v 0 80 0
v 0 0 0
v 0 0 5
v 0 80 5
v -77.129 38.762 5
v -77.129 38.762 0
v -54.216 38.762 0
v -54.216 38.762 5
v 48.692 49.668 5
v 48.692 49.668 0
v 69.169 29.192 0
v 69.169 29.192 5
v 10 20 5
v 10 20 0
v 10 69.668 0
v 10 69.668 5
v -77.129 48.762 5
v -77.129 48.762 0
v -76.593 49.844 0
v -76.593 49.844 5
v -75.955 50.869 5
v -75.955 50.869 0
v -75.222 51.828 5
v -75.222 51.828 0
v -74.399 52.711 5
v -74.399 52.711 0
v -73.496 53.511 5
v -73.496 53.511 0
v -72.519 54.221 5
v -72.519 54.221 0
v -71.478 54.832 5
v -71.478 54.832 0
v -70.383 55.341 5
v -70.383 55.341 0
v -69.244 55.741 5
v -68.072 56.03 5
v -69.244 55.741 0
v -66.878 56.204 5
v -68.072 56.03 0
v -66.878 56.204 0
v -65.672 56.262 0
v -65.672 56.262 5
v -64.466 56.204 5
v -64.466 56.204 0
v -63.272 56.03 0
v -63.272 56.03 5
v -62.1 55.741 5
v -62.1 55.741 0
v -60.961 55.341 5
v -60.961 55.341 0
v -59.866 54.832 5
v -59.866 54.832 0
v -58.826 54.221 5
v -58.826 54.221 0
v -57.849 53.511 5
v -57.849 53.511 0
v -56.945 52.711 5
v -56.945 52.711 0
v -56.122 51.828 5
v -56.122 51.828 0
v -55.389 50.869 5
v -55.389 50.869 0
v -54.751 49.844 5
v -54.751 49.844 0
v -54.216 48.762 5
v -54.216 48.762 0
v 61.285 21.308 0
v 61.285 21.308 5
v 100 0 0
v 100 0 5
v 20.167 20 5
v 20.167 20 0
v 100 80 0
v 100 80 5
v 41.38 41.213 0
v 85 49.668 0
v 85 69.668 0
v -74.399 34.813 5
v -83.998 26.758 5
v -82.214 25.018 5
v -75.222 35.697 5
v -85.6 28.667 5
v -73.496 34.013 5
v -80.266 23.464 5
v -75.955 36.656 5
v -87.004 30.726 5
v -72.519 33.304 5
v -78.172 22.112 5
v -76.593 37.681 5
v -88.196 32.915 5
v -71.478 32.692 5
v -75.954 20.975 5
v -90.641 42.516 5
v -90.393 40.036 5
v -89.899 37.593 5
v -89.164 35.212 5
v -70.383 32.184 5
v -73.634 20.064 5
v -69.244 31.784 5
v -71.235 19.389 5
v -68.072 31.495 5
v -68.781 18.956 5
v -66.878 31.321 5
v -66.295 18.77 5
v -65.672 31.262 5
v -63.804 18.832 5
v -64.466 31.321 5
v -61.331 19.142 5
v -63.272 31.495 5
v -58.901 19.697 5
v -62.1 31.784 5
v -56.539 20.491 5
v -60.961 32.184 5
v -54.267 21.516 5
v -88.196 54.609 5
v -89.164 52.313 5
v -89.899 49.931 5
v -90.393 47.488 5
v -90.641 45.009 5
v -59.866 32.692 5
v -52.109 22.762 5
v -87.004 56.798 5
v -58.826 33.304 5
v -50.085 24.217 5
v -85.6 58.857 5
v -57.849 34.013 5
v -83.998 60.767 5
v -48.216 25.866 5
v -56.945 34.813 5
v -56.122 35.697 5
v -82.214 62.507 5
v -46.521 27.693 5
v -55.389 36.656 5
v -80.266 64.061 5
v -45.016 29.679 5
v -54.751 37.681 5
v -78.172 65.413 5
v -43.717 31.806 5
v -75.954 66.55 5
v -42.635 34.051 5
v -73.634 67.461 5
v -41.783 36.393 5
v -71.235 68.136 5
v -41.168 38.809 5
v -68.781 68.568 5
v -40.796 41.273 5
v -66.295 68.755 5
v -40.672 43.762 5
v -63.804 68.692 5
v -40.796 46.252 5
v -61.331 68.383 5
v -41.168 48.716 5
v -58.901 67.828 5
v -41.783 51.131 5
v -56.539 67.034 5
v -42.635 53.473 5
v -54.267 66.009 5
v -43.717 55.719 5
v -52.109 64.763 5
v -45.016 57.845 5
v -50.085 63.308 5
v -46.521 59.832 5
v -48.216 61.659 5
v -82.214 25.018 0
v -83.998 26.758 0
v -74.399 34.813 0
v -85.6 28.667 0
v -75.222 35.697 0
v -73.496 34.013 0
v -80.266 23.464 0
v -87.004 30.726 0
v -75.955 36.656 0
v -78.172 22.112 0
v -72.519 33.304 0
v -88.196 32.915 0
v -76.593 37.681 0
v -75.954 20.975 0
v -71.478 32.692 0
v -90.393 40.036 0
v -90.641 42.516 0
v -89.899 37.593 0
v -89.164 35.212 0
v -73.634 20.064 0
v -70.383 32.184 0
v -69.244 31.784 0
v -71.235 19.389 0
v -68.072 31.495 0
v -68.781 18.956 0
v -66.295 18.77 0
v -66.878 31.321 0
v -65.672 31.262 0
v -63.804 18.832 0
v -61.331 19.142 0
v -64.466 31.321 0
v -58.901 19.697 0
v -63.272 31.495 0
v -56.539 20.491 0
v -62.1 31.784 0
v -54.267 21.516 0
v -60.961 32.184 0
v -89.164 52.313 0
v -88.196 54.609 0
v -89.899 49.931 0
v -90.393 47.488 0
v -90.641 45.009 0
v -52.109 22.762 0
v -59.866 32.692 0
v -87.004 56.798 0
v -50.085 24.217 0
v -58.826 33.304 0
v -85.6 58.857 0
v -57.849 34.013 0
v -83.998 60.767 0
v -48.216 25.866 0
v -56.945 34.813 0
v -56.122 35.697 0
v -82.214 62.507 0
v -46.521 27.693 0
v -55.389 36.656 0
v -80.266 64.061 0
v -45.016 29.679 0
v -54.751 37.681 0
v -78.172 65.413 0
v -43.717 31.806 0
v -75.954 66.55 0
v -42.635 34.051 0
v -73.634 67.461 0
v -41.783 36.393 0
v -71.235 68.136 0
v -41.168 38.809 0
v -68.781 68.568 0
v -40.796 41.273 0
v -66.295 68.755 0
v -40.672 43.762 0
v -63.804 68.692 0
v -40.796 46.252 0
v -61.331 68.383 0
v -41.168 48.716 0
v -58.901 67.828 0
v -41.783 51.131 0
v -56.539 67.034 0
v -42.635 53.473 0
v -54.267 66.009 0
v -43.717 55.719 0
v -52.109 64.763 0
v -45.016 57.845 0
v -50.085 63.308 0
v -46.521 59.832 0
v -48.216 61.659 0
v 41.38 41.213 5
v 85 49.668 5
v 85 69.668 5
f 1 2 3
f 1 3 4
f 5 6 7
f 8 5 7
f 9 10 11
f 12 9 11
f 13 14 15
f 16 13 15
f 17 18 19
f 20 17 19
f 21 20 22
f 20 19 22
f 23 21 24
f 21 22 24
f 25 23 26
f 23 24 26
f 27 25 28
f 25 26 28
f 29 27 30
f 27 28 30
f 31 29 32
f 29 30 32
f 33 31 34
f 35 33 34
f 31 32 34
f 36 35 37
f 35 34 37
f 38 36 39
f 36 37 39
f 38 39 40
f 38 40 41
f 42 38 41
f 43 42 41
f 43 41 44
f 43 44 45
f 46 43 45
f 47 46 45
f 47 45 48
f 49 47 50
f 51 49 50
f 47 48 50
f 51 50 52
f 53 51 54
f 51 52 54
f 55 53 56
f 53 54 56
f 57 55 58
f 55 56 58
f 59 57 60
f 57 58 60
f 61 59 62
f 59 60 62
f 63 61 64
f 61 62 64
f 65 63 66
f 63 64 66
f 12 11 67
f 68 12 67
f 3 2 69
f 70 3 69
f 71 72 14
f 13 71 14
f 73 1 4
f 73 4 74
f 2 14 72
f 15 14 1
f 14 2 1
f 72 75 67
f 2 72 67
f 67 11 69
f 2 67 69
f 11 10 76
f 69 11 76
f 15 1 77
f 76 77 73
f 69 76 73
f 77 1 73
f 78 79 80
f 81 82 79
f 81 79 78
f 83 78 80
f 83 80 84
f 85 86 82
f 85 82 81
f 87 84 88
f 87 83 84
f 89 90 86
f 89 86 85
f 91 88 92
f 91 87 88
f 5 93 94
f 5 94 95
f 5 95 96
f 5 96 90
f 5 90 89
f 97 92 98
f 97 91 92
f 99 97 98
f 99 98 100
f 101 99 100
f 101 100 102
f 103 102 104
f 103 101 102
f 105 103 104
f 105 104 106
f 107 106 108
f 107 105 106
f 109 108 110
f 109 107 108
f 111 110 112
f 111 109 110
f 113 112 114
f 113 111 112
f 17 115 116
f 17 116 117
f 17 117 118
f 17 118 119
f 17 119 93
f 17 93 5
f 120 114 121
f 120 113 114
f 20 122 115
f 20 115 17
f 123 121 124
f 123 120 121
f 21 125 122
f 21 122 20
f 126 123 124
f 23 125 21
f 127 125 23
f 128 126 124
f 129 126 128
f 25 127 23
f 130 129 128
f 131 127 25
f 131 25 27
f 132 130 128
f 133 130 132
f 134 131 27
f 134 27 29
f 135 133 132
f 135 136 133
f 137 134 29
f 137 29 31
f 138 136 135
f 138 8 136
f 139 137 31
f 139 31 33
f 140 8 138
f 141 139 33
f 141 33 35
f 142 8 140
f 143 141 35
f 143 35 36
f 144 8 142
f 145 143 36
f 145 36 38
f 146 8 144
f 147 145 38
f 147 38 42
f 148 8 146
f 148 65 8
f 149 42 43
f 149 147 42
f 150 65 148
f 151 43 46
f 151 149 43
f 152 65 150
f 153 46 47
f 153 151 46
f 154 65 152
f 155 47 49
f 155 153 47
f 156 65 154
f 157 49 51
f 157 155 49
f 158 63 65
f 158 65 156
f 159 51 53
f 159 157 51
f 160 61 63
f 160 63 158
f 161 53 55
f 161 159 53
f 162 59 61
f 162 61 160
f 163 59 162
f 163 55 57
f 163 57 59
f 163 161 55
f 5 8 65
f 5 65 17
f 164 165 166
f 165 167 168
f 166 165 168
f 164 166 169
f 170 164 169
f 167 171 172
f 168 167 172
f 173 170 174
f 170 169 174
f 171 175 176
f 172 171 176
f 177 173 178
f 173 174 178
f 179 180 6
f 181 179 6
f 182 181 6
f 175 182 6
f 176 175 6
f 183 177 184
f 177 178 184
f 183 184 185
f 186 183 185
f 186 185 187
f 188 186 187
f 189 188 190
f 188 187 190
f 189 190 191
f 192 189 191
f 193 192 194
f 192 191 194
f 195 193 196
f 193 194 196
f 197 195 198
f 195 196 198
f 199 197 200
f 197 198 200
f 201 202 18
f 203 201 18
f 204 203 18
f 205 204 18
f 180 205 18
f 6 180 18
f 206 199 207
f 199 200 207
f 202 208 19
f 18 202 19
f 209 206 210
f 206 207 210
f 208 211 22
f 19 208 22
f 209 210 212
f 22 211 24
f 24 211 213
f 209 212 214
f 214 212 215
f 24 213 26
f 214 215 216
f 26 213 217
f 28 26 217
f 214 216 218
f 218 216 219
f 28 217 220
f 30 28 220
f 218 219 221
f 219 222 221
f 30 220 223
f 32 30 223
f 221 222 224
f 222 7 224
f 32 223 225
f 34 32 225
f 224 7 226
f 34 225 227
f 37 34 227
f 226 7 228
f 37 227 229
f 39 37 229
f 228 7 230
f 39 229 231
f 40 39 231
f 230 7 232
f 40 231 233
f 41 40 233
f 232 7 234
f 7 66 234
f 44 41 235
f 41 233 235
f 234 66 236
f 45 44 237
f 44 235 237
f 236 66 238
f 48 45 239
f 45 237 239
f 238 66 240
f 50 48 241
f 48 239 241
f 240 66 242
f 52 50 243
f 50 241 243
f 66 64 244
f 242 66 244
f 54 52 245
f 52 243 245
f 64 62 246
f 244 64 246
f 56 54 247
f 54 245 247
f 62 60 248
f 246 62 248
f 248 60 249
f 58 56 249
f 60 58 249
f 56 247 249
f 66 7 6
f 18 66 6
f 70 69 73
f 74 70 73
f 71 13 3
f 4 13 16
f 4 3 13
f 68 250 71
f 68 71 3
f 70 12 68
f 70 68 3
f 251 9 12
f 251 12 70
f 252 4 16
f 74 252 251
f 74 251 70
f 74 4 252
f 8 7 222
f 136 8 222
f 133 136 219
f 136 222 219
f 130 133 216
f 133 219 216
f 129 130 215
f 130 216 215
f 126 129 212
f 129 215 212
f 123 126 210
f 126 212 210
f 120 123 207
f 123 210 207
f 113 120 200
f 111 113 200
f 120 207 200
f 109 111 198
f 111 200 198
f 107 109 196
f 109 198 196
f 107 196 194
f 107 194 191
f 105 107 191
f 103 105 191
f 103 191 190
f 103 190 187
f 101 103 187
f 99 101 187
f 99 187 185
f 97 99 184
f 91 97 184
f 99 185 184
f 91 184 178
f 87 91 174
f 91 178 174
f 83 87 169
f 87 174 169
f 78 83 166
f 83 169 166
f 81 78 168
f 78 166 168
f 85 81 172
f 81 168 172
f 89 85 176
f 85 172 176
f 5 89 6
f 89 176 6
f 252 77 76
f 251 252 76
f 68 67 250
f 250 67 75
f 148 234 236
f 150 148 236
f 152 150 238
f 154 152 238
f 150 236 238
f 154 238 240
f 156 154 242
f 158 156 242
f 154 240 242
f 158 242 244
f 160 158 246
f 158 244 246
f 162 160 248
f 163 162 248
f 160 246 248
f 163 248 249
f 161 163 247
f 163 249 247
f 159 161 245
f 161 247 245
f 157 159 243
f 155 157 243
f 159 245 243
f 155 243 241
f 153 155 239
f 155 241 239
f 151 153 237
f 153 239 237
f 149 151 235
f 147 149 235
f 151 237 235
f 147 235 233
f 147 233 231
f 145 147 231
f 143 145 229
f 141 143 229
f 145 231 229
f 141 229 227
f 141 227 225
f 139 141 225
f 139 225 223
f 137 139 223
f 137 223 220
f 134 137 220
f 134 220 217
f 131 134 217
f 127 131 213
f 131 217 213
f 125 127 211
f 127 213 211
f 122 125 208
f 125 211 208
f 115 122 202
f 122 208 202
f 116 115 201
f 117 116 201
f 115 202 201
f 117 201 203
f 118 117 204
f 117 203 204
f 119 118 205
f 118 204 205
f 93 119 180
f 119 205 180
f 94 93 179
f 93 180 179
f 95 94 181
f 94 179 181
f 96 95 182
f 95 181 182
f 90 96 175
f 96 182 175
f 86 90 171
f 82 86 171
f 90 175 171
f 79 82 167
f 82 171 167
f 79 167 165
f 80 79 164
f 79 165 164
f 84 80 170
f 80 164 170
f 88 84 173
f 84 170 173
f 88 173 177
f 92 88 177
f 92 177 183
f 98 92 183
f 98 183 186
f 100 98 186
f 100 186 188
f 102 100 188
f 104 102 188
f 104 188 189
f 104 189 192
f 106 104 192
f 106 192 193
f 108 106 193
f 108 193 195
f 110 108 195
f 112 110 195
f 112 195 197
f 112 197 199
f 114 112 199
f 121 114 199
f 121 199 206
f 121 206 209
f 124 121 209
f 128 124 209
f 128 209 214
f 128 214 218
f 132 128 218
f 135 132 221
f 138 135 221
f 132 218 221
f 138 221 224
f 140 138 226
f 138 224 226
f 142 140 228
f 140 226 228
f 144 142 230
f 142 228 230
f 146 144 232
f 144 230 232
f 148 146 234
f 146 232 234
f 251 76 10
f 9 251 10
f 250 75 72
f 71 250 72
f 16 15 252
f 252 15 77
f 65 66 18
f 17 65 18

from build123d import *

# Parameters (mm, degrees)
F0_R     = 25
F0_W     = 100
F0_H     = 80
F1_DEPTH = 5


with BuildPart() as f1:
    # F0 (on Top) → F1 (new body)
    with BuildSketch(Plane.XY):
        with Locations((-65.672178, 43.762353)):
            Circle(F0_R)
        with BuildLine():
            ThreePointArc((-54.215738, 38.762353), (-65.672178, 31.262353), (-77.128617, 38.762353))
            Line((-77.128617, 38.762353), (-54.215738, 38.762353))
        make_face(mode=Mode.SUBTRACT)
        with BuildLine():
            Line((-54.215738, 48.762353), (-77.128617, 48.762353))
            ThreePointArc((-77.128617, 48.762353), (-65.672178, 56.262353), (-54.215738, 48.762353))
        make_face(mode=Mode.SUBTRACT)
        with Locations((50, 40)):
            Rectangle(F0_W, F0_H)
        Polygon((20.166516, 20), (10, 20), (10, 69.668166), (85, 69.668166), (85, 49.668166), (48.692464, 49.668166), (69.168812, 29.191819), (61.284958, 21.307965), (41.379719, 41.213203), align=None, mode=Mode.SUBTRACT)
    extrude(amount=F1_DEPTH)


solid = f1.part
